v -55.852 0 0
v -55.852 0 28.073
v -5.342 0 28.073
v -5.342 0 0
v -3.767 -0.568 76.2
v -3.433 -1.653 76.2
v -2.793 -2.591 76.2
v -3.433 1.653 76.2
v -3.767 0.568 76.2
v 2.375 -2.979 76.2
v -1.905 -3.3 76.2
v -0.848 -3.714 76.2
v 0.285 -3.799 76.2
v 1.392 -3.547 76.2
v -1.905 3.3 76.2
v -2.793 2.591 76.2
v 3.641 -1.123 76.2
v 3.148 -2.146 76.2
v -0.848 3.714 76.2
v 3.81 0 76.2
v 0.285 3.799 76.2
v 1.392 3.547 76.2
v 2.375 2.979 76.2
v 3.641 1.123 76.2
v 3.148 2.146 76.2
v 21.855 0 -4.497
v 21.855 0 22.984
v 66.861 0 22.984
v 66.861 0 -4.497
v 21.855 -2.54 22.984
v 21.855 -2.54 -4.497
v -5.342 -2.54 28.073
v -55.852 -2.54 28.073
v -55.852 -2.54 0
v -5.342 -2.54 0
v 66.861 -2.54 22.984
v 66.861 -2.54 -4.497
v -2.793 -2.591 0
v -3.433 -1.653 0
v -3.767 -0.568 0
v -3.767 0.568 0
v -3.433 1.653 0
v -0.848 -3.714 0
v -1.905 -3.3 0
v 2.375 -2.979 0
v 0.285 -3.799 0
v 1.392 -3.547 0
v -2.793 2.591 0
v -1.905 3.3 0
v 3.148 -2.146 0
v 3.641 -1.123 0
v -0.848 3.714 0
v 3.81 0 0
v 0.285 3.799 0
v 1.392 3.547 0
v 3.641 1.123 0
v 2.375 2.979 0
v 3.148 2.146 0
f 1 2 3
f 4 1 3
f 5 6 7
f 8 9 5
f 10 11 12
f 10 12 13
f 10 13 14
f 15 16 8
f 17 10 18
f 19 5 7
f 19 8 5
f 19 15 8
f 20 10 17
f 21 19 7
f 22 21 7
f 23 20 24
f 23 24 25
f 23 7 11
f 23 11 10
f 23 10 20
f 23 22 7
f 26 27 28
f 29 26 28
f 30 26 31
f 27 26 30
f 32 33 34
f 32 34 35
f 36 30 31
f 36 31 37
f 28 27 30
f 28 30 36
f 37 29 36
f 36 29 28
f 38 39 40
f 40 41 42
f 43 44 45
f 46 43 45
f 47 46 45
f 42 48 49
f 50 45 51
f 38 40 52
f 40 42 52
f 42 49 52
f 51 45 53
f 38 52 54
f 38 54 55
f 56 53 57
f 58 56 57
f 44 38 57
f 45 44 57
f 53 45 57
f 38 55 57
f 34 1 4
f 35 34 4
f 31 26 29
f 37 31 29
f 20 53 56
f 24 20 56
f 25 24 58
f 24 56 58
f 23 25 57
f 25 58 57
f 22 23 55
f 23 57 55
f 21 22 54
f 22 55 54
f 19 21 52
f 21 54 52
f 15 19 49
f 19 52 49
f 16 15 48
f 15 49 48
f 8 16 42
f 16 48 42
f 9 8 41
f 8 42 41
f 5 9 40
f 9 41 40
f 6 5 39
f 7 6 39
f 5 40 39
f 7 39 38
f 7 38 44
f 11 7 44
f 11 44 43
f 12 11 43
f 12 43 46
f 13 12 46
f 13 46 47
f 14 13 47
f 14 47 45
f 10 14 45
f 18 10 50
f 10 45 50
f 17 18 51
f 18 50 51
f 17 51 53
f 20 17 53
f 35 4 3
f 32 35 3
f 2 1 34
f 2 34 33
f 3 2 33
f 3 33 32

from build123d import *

# Parameters (mm, degrees)
F0_W     = 50.510075
F0_H     = 28.073099
F1_DEPTH = 2.54
F2_W     = 45.005768
F2_H     = 27.480781
F3_DEPTH = 2.54
F4_R     = 3.81
F5_DEPTH = 76.2


with BuildPart() as f1:
    # F0 (on Front) → F1 (new body)
    with BuildSketch(Plane.XZ):
        with Locations((-30.597454, 14.036549)):
            Rectangle(F0_W, F0_H)
    extrude(amount=F1_DEPTH)


with BuildPart() as f3:
    # F2 (on Front) → F3 (new body)
    with BuildSketch(Plane.XZ):
        with Locations((44.358209, 9.243501)):
            Rectangle(F2_W, F2_H)
    extrude(amount=F3_DEPTH)


with BuildPart() as f5:
    # F4 (on Top) → F5 (new body)
    with BuildSketch(Plane.XY):
        Circle(F4_R)
    extrude(amount=F5_DEPTH)


solid = Compound([f1.part, f3.part, f5.part])
